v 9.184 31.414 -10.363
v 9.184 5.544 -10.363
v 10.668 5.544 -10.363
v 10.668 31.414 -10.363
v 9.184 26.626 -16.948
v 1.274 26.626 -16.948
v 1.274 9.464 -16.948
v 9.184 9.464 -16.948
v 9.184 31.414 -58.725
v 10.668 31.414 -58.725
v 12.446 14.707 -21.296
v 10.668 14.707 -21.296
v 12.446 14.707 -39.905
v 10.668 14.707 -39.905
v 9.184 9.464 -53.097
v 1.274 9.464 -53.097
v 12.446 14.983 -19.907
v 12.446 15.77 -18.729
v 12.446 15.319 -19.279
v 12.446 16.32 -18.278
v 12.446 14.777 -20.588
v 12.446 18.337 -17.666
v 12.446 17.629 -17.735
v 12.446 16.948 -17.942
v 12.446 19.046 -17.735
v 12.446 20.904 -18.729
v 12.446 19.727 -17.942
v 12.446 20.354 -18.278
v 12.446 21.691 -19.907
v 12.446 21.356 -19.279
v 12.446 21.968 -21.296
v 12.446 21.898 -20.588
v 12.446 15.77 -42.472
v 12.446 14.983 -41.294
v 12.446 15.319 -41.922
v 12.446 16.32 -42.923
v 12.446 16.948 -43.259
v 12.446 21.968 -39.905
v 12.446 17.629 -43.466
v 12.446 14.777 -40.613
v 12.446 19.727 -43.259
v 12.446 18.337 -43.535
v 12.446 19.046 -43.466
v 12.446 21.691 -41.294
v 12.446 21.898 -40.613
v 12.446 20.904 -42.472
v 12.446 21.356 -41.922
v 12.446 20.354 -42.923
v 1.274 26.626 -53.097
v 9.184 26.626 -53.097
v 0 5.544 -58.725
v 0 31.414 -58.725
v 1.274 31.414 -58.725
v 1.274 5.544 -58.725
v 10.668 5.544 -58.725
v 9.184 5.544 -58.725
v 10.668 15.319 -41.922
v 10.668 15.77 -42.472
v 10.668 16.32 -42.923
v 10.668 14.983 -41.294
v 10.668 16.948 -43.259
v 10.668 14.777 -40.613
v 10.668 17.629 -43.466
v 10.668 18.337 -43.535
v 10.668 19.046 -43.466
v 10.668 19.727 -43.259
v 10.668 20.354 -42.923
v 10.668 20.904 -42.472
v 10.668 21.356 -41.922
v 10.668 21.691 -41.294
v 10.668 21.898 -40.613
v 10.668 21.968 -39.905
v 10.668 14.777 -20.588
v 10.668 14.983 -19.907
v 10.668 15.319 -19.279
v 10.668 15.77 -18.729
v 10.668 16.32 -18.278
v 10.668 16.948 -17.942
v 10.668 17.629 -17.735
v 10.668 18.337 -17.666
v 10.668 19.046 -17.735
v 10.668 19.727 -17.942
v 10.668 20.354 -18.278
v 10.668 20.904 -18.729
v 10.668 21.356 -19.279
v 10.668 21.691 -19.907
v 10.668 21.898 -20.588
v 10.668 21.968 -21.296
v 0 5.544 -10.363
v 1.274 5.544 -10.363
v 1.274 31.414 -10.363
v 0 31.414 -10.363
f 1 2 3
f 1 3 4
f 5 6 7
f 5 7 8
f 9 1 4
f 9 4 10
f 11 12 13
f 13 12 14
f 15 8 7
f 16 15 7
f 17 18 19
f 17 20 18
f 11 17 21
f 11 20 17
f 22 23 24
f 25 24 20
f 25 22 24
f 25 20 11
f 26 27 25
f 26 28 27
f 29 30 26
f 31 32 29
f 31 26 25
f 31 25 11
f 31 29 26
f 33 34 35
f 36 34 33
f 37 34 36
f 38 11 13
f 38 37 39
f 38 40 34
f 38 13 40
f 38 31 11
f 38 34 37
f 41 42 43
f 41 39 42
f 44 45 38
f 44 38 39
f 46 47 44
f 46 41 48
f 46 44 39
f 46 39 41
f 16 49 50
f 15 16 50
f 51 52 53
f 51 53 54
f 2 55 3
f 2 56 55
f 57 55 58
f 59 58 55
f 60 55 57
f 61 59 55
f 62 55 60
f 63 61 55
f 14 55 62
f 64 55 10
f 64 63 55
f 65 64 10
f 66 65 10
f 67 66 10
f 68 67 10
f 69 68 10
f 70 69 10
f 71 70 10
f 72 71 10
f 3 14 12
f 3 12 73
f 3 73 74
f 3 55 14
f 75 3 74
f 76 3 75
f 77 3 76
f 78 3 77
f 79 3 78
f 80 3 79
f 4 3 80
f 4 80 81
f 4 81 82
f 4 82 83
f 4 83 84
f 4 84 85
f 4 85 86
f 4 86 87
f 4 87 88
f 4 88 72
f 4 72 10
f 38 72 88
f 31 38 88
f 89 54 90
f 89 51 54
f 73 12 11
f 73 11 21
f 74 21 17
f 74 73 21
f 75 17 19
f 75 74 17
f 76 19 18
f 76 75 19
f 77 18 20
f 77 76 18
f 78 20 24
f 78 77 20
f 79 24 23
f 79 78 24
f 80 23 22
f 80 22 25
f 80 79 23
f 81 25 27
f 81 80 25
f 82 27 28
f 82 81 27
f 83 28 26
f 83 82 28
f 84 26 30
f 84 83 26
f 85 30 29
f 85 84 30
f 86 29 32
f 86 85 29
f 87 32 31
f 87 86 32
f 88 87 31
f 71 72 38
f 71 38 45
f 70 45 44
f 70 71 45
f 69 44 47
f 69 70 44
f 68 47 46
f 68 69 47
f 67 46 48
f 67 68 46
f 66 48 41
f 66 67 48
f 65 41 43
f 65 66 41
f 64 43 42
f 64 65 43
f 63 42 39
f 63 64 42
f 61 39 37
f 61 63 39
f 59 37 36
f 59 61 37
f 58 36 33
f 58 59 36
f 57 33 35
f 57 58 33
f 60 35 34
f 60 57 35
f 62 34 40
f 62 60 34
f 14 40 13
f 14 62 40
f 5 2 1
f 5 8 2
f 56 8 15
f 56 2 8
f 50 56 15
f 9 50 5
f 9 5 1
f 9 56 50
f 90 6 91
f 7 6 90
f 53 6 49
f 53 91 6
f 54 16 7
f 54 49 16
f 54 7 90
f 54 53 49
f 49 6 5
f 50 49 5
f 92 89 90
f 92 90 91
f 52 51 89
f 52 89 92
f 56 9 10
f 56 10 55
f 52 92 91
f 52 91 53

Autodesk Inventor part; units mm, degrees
ref_plane "YZ Plane" through (0, 0, 0) normal (1, 0, 0) x (0, 1, 0)
ref_plane "XZ Plane" through (0, 0, 0) normal (0, 1, 0) x (-1, 0, 0)
ref_plane "XY Plane" through (0, 0, 0) normal (0, 0, 1) x (1, 0, 0)
sketch "Sketch1" plane through (0, 0, 0) normal (1, 0, 0) x (0, 1, 0)
  line L0 (0, 0) -> (36.957, 0)
  line L1 (36.957, 0) -> (36.957, -69.088)
  line L2 (36.957, -69.088) -> (0, -69.088)
  line L3 (0, -69.088) -> (0, 0)
  dimension "d0" = 69.088
  dimension "d1" = 36.957
extrude "Extrusion1" add sketch "Sketch1" along normal blind 15.24
sketch "Sketch2" plane through (15.24, 0, 0) normal (1, 0, 0) x (0, 0, -1)
  line L0 (15.6183, 18.2767) -> (42.2027, 18.2767) construction
  line L1 (15.6183, 13.0907) -> (42.2027, 13.0907)
  line L2 (42.2027, 23.4628) -> (15.6183, 23.4628)
  arc A0 (15.6183, 23.4628) -> (15.6183, 13.0907) centre (15.6183, 18.2767) ccw
  arc A1 (42.2027, 13.0907) -> (42.2027, 23.4628) centre (42.2027, 18.2767) ccw
  point P0 (0, 0)
  point P1 (28.9105, 18.2767)
extrude "Extrusion2" add sketch "Sketch2" along normal blind 2.54
sketch "Sketch3" plane through (0, 0, -69.088) normal (0, 0, -1) x (-1, 0, 0)
  line L0 (-1.8203, -2.1906) -> (-13.1197, -2.1906)
  line L1 (-13.1197, -2.1906) -> (-13.1197, 2.4256)
  line L2 (-13.1197, 2.4256) -> (-1.8203, 2.4256)
  line L3 (-1.8203, 2.4256) -> (-1.8203, -2.1906)
  line L4 (-13.1197, 39.0109) -> (-1.8203, 39.0109)
  line L5 (-1.8203, 39.0109) -> (-1.8203, 33.2923)
  line L6 (-1.8203, 33.2923) -> (-13.1197, 33.2923)
  line L7 (-13.1197, 33.2923) -> (-13.1197, 39.0109)
  point P0 (0, 0)
extrude "Extrusion3" cut sketch "Sketch3" against normal blind 136.525
sketch "Sketch4" plane through (1.8203, 33.2923, -69.088) normal (0, 1, 0) x (1, 0, 0)
  line L0 (11.2994, 0) -> (11.2994, -69.088) projected
  line L1 (0, 0) -> (0, -69.088) projected
  line L2 (11.2994, 0) -> (0, 0)
  line L3 (0, 0) -> (0, -4.865)
  line L4 (0, -4.865) -> (11.2994, -4.865)
  line L5 (11.2994, -4.865) -> (11.2994, 0)
  line L6 (11.2994, -69.088) -> (13.4197, -69.088) projected
  line L7 (11.2994, -69.088) -> (0, -69.088)
  line L8 (0, -69.088) -> (0, -62.856)
  line L9 (0, -62.856) -> (11.2994, -62.856)
  line L10 (11.2994, -62.856) -> (11.2994, -69.088)
  point P0 (-1.8203, -69.088)
extrude "Extrusion4" cut sketch "Sketch4" against normal blind 136.525 contours L0 L4 L1 L2 | L0 L7 L1 L9
offset faces "Size1" outward -3.175 faces at (9.3532, 2.4256, -25.5623) (9.3532, 23.0034, -6.232) (5.5868, 33.2923, -44.8927) (5.5868, 23.0034, -64.223)
scale "Scale1" factors (0.7, 0.7, 0.7) then translate (0, 5.5436, -10.3632) bodies 1
properties part number "co2sensor"
